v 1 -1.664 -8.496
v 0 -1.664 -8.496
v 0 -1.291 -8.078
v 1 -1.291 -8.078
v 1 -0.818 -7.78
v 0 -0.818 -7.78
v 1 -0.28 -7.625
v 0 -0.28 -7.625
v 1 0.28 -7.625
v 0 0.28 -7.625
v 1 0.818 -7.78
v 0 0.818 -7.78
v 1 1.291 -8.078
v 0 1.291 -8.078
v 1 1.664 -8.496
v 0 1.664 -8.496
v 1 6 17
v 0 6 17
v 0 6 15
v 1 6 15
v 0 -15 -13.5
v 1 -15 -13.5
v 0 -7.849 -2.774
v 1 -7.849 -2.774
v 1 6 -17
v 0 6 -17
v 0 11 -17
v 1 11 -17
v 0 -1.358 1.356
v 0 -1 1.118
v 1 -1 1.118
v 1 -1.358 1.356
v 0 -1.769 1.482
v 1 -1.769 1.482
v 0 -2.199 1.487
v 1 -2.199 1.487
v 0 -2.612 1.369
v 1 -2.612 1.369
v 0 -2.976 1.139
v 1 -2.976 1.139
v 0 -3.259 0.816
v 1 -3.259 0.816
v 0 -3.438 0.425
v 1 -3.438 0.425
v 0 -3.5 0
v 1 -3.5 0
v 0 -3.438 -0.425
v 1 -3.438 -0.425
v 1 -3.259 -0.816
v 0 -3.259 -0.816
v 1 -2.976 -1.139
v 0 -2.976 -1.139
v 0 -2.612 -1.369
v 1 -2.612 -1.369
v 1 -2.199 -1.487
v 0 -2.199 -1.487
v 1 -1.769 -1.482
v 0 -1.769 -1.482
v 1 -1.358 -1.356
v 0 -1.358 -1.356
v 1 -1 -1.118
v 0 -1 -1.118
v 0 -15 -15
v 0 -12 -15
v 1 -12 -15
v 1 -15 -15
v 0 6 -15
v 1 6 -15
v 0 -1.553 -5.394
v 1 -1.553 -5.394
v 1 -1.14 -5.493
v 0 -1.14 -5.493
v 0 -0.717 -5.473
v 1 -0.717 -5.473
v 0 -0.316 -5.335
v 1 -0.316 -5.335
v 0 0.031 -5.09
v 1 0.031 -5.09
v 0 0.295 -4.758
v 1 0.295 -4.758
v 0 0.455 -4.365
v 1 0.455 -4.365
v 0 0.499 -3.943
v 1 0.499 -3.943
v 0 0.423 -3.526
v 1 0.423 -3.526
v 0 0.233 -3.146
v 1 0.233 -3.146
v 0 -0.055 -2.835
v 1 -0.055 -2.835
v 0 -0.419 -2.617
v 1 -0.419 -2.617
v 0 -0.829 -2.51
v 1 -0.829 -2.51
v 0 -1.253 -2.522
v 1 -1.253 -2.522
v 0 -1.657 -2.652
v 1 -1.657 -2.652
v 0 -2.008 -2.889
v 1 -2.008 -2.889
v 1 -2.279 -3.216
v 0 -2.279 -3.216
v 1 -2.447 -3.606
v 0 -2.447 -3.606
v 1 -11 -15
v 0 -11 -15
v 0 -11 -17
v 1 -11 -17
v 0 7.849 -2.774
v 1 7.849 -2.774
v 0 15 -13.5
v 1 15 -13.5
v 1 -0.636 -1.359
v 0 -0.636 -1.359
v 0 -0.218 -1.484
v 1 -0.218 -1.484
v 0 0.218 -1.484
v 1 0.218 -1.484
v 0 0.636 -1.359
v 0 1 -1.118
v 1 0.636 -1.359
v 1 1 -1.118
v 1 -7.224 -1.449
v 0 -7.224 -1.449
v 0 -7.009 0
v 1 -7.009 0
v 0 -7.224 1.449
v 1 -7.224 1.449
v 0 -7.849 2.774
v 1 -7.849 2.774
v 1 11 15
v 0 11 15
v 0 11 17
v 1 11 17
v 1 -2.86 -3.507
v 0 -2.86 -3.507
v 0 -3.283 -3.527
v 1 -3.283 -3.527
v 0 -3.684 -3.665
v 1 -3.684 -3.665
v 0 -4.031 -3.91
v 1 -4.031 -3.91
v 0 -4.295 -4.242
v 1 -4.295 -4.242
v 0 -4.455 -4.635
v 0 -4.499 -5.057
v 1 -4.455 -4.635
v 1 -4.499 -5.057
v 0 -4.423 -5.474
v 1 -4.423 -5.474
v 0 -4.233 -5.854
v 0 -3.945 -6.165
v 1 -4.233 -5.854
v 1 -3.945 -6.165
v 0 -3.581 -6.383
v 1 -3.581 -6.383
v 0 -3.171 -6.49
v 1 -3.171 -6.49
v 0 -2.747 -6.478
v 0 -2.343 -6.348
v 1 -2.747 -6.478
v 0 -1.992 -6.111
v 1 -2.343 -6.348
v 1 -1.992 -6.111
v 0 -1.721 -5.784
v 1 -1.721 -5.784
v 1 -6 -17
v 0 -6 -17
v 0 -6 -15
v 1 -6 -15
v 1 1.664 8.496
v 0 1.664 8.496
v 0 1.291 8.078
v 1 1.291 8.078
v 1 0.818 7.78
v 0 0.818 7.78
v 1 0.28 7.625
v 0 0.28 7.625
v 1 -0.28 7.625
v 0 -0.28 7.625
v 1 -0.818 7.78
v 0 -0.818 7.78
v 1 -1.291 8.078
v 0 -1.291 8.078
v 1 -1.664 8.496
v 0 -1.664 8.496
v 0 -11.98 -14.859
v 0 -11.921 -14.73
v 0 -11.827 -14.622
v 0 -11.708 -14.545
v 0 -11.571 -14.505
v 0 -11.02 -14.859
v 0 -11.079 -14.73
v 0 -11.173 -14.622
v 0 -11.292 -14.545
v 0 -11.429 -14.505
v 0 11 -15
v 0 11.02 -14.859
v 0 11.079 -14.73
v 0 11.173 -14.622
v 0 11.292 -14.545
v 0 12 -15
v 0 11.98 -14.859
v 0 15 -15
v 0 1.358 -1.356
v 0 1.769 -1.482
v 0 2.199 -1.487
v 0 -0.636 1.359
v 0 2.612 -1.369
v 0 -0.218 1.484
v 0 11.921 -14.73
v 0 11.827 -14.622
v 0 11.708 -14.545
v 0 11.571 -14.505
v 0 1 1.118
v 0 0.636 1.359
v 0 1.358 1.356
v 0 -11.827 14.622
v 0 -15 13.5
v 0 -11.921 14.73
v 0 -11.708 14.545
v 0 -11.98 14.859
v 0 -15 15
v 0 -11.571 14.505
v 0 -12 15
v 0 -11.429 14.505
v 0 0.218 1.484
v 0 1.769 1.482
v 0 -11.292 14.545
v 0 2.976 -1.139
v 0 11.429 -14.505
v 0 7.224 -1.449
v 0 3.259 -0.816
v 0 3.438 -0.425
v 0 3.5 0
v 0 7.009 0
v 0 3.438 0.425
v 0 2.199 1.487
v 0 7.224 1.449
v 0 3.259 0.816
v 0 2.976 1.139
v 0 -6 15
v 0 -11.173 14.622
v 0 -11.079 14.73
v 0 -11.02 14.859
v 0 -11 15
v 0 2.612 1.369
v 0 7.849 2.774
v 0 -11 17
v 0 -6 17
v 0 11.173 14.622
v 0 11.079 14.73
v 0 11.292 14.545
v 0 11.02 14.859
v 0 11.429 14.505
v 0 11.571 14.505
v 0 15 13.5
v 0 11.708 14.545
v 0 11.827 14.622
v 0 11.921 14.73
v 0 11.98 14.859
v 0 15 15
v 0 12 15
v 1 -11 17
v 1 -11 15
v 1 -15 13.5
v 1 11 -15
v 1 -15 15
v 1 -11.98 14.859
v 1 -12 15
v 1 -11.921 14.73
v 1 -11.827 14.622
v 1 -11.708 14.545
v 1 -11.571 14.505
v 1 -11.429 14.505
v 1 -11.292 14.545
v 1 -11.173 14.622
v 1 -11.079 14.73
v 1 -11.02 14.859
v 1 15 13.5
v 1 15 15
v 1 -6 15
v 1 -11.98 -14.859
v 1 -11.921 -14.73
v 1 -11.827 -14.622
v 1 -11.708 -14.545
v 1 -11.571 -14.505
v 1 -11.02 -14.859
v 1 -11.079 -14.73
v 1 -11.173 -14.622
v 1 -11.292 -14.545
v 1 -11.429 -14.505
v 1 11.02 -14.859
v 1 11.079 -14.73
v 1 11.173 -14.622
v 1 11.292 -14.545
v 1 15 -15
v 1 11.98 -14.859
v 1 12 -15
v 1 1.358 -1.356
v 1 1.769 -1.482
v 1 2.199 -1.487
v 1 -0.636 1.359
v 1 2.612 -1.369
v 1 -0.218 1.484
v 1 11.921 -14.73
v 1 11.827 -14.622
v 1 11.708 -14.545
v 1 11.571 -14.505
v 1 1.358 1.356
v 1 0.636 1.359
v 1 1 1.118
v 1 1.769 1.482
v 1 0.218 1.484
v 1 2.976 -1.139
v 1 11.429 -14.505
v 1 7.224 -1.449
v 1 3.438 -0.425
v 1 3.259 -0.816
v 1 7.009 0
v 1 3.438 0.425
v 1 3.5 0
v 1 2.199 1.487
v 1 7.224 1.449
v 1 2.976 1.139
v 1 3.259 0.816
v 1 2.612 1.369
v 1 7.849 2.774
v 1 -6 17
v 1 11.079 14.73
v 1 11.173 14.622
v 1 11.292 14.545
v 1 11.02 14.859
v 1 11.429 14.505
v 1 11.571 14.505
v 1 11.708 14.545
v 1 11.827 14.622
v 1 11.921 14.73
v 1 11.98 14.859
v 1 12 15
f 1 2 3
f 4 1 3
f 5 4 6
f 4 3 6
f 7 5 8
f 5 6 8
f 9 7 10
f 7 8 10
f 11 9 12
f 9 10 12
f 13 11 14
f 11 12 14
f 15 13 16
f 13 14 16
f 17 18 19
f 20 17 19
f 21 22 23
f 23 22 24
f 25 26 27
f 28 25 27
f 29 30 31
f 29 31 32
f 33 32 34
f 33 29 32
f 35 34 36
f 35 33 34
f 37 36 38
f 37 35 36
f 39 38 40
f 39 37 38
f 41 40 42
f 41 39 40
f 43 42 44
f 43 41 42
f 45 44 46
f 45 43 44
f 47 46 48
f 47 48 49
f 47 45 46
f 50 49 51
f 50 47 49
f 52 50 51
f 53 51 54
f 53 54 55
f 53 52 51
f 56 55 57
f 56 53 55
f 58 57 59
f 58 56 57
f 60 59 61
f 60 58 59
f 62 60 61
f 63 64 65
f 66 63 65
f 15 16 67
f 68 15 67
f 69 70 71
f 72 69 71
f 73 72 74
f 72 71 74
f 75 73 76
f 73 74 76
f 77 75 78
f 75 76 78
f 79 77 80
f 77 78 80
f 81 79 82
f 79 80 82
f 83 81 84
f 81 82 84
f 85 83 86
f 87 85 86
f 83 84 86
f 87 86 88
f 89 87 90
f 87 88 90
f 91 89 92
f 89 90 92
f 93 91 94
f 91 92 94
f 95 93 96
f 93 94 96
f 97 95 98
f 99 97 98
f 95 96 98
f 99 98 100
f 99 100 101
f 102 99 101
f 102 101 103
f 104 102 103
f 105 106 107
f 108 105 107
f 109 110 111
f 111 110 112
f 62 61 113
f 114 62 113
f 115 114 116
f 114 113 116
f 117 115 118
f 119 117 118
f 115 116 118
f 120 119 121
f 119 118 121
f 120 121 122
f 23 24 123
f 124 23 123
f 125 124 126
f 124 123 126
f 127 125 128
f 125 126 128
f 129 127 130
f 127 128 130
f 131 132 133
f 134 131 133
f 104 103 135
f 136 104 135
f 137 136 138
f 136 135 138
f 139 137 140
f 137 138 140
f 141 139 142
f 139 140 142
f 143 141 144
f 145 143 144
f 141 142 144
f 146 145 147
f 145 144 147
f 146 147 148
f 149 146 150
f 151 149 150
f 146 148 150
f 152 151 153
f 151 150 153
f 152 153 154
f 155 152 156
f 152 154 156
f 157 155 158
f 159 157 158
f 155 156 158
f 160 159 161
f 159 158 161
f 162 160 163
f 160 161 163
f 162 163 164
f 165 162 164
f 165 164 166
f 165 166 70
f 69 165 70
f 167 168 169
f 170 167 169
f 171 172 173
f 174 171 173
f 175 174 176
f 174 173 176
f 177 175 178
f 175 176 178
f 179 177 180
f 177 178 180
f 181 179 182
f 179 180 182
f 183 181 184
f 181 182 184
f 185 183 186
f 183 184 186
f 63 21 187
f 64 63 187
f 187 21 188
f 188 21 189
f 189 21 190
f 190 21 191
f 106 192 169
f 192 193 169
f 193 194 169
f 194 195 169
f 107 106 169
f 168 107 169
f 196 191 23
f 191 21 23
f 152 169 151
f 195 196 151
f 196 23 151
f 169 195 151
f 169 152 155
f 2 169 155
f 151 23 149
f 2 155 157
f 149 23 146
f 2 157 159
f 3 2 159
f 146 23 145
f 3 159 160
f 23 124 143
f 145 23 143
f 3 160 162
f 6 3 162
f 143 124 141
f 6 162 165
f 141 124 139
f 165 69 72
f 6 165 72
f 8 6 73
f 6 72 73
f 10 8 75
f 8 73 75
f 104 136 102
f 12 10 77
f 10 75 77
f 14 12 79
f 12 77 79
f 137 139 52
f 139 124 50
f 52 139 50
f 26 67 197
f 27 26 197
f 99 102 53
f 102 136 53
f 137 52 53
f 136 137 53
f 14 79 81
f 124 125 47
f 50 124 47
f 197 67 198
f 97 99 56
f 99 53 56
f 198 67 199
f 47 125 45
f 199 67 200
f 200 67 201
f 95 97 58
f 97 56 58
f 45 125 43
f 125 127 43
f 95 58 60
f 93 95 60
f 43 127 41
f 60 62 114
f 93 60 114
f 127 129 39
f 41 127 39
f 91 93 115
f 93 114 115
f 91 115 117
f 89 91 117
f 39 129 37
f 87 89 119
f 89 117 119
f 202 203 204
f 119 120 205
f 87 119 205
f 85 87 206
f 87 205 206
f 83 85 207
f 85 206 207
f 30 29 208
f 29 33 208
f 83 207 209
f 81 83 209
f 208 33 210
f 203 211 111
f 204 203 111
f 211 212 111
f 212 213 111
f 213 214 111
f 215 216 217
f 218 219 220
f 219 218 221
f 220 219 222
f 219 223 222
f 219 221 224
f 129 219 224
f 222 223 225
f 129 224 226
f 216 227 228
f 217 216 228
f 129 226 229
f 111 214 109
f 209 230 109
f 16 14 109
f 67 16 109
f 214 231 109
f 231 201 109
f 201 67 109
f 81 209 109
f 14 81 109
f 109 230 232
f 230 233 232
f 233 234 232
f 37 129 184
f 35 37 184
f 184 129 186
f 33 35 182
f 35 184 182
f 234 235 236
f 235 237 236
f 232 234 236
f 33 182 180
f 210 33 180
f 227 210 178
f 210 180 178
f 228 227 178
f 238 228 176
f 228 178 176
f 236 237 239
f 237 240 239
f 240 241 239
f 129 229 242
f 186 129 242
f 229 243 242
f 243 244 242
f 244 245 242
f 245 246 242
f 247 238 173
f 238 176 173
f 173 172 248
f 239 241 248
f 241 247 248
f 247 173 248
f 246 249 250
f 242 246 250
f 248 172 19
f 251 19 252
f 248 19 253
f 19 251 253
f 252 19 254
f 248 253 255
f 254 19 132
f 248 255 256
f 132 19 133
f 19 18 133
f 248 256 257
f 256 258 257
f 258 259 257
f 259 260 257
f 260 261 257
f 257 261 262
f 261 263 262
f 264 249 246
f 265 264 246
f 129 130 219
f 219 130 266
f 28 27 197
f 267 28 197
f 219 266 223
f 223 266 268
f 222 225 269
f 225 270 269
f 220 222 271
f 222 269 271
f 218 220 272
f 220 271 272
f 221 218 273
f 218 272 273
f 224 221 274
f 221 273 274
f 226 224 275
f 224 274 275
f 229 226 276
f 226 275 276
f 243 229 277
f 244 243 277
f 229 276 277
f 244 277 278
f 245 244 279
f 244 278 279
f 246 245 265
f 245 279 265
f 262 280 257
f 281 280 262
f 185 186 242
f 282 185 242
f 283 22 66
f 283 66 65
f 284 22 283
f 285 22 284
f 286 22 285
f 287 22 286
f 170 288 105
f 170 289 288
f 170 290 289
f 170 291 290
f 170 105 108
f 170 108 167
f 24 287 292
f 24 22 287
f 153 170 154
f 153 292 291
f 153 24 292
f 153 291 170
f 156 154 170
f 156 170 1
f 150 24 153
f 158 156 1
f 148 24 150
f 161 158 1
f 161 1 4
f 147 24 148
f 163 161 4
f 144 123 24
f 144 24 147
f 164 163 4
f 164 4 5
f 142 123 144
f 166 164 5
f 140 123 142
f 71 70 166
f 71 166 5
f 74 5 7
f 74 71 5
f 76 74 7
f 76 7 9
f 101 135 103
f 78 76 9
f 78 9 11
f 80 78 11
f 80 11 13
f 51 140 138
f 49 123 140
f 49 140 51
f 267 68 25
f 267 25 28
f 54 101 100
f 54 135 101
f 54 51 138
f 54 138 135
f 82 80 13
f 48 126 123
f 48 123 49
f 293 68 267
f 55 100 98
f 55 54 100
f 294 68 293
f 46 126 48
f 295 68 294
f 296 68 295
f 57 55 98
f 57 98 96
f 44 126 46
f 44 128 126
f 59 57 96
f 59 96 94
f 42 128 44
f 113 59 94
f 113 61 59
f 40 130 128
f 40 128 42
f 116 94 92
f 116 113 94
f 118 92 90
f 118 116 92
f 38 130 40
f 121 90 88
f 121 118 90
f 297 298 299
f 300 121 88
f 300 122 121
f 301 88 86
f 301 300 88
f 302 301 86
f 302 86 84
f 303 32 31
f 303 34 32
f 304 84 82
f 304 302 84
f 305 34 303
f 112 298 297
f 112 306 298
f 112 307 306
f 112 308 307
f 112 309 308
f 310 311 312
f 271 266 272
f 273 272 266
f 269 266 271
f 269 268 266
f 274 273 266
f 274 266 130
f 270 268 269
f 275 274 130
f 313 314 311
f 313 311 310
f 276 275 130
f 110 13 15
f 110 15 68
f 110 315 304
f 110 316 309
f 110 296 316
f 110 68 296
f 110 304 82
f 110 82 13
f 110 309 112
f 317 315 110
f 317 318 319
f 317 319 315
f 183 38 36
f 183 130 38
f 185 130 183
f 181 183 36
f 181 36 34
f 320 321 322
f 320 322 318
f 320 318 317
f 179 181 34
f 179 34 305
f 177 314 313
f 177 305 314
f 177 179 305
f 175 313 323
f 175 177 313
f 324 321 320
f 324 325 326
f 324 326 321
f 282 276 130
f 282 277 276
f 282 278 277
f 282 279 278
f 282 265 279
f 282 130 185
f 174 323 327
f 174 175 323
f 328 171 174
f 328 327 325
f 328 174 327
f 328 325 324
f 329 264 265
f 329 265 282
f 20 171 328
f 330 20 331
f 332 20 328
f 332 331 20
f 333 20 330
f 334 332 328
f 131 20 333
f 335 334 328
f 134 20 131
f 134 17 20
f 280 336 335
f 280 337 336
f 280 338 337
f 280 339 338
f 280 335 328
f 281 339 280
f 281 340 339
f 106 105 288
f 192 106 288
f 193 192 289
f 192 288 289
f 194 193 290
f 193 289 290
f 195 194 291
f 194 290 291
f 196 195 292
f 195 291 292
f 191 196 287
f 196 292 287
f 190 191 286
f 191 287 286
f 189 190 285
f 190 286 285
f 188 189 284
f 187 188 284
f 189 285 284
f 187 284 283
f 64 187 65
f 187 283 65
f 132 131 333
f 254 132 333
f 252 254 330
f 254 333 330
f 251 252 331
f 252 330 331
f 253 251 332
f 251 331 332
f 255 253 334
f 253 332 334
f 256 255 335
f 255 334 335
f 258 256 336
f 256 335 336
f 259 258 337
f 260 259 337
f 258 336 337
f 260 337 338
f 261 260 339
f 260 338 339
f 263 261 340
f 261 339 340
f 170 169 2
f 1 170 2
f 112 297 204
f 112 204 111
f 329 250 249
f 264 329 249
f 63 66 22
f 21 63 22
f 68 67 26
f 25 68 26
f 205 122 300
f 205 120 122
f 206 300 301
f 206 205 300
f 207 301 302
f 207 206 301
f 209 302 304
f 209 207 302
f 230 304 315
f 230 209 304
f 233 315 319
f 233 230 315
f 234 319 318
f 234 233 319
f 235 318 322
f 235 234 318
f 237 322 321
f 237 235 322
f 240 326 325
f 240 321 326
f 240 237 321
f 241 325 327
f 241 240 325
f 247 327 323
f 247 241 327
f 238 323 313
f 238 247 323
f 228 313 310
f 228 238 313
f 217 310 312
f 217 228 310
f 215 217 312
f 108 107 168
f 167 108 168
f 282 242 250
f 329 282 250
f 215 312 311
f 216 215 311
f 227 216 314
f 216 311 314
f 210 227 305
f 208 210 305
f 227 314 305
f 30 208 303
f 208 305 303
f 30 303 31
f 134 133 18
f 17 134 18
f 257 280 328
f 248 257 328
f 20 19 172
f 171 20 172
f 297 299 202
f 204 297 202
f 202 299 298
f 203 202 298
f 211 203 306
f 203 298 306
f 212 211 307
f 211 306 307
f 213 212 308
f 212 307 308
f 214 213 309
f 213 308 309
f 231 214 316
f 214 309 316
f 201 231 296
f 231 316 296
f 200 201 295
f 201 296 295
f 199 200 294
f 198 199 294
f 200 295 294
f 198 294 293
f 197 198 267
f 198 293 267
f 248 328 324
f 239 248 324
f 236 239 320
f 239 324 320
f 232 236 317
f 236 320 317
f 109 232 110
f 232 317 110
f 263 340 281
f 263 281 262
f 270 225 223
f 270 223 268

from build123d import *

# Parameters (mm, degrees)
F0_R      = 1.5
F1_DEPTH  = 1
F2_W      = 1
F2_H      = 30
F3_DEPTH  = 5
F4_W      = 1
F4_H      = 30
F5_DEPTH  = 5
F6_R      = 0.5
F7_DEPTH  = 25
F9_DEPTH  = 25
F10_W     = 5
F10_H     = 35
F11_DEPTH = 25
F12_R     = 1.5
F13_DEPTH = 25


with BuildPart() as f1:
    # F0 (on Right) → F1 (new body)
    with BuildSketch(Plane.YZ):
        with BuildLine():
            Line((-6, 17), (-11, 17))
            Line((-11, 17), (-11, 0))
            Line((-11, 0), (-11, -17))
            Line((-11, -17), (-6, -17))
            Line((-6, -17), (-6, -15))
            Line((-6, -15), (-1.664101, -8.496151))
            ThreePointArc((-1.664101, -8.496151), (0, -7.605551), (1.664101, -8.496151))
            Line((1.664101, -8.496151), (6, -15))
            Line((6, -15), (6, -17))
            Line((6, -17), (11, -17))
            Line((11, -17), (11, 0))
            Line((11, 0), (11, 17))
            Line((11, 17), (6, 17))
            Line((6, 17), (6, 15))
            Line((6, 15), (1.664101, 8.496151))
            ThreePointArc((1.664101, 8.496151), (0, 7.605551), (-1.664101, 8.496151))
            Line((-1.664101, 8.496151), (-6, 15))
            Line((-6, 15), (-6, 17))
        make_face()
        with Locations((-2, 0)):
            Circle(F0_R, mode=Mode.SUBTRACT)
        with Locations((2, 0)):
            Circle(F0_R, mode=Mode.SUBTRACT)
    extrude(amount=F1_DEPTH)

    # F2 (on face) → F3 (join)
    with BuildSketch(Plane.XZ.offset(11)):
        with Locations((0.5, 0)):
            Rectangle(F2_W, F2_H)
    extrude(amount=F3_DEPTH)

    # F4 (on face) → F5 (join)
    with BuildSketch(Plane(origin=(0, 11, 0), x_dir=(-1, 0, 0), z_dir=(0, 1, 0))):
        with Locations((-0.5, 0)):
            Rectangle(F4_W, F4_H)
    extrude(amount=F5_DEPTH)

    # F6 (on face) → F7 (cut)
    with BuildSketch(Plane.YZ.offset(1)):
        with Locations((-11.5, 15)):
            Circle(F6_R)
        with Locations((11.5, 15)):
            Circle(F6_R)
        with Locations((-11.5, -15)):
            Circle(F6_R)
        with Locations((11.5, -15)):
            Circle(F6_R)
    extrude(amount=-F7_DEPTH, mode=Mode.SUBTRACT)

    # F8 (on face) → F9 (cut)
    with BuildSketch(Plane.YZ.offset(1)):
        with BuildLine():
            Line((-7.849001, 2.773501), (-16, 15))
            Line((-16, 15), (-16, -15))
            Line((-16, -15), (-7.849001, -2.773501))
            ThreePointArc((-7.849001, -2.773501), (-7.009252, 0), (-7.849001, 2.773501))
        make_face()
        with BuildLine():
            Line((16, -15), (16, 15))
            Line((16, 15), (7.849001, 2.773501))
            ThreePointArc((7.849001, 2.773501), (7.009252, 0), (7.849001, -2.773501))
            Line((7.849001, -2.773501), (16, -15))
        make_face()
    extrude(amount=-F9_DEPTH, mode=Mode.SUBTRACT)

    # F10 (on face) → F11 (cut)
    with BuildSketch(Plane.YZ.offset(1)):
        with Locations((-17.5, 0)):
            Rectangle(F10_W, F10_H)
        with Locations((17.5, 0)):
            Rectangle(F10_W, F10_H)
    extrude(amount=-F11_DEPTH, mode=Mode.SUBTRACT)

    # F12 (on face) → F13 (cut)
    with BuildSketch(Plane.YZ.offset(1)):
        Circle(F12_R)
        with BuildLine():
            ThreePointArc((-2.447214, -3.605573), (-4.341641, -5.67082), (-1.552786, -5.394427))
            ThreePointArc((-1.552786, -5.394427), (0.341641, -3.32918), (-2.447214, -3.605573))
        make_face()
    extrude(amount=-F13_DEPTH, mode=Mode.SUBTRACT)


solid = f1.part
